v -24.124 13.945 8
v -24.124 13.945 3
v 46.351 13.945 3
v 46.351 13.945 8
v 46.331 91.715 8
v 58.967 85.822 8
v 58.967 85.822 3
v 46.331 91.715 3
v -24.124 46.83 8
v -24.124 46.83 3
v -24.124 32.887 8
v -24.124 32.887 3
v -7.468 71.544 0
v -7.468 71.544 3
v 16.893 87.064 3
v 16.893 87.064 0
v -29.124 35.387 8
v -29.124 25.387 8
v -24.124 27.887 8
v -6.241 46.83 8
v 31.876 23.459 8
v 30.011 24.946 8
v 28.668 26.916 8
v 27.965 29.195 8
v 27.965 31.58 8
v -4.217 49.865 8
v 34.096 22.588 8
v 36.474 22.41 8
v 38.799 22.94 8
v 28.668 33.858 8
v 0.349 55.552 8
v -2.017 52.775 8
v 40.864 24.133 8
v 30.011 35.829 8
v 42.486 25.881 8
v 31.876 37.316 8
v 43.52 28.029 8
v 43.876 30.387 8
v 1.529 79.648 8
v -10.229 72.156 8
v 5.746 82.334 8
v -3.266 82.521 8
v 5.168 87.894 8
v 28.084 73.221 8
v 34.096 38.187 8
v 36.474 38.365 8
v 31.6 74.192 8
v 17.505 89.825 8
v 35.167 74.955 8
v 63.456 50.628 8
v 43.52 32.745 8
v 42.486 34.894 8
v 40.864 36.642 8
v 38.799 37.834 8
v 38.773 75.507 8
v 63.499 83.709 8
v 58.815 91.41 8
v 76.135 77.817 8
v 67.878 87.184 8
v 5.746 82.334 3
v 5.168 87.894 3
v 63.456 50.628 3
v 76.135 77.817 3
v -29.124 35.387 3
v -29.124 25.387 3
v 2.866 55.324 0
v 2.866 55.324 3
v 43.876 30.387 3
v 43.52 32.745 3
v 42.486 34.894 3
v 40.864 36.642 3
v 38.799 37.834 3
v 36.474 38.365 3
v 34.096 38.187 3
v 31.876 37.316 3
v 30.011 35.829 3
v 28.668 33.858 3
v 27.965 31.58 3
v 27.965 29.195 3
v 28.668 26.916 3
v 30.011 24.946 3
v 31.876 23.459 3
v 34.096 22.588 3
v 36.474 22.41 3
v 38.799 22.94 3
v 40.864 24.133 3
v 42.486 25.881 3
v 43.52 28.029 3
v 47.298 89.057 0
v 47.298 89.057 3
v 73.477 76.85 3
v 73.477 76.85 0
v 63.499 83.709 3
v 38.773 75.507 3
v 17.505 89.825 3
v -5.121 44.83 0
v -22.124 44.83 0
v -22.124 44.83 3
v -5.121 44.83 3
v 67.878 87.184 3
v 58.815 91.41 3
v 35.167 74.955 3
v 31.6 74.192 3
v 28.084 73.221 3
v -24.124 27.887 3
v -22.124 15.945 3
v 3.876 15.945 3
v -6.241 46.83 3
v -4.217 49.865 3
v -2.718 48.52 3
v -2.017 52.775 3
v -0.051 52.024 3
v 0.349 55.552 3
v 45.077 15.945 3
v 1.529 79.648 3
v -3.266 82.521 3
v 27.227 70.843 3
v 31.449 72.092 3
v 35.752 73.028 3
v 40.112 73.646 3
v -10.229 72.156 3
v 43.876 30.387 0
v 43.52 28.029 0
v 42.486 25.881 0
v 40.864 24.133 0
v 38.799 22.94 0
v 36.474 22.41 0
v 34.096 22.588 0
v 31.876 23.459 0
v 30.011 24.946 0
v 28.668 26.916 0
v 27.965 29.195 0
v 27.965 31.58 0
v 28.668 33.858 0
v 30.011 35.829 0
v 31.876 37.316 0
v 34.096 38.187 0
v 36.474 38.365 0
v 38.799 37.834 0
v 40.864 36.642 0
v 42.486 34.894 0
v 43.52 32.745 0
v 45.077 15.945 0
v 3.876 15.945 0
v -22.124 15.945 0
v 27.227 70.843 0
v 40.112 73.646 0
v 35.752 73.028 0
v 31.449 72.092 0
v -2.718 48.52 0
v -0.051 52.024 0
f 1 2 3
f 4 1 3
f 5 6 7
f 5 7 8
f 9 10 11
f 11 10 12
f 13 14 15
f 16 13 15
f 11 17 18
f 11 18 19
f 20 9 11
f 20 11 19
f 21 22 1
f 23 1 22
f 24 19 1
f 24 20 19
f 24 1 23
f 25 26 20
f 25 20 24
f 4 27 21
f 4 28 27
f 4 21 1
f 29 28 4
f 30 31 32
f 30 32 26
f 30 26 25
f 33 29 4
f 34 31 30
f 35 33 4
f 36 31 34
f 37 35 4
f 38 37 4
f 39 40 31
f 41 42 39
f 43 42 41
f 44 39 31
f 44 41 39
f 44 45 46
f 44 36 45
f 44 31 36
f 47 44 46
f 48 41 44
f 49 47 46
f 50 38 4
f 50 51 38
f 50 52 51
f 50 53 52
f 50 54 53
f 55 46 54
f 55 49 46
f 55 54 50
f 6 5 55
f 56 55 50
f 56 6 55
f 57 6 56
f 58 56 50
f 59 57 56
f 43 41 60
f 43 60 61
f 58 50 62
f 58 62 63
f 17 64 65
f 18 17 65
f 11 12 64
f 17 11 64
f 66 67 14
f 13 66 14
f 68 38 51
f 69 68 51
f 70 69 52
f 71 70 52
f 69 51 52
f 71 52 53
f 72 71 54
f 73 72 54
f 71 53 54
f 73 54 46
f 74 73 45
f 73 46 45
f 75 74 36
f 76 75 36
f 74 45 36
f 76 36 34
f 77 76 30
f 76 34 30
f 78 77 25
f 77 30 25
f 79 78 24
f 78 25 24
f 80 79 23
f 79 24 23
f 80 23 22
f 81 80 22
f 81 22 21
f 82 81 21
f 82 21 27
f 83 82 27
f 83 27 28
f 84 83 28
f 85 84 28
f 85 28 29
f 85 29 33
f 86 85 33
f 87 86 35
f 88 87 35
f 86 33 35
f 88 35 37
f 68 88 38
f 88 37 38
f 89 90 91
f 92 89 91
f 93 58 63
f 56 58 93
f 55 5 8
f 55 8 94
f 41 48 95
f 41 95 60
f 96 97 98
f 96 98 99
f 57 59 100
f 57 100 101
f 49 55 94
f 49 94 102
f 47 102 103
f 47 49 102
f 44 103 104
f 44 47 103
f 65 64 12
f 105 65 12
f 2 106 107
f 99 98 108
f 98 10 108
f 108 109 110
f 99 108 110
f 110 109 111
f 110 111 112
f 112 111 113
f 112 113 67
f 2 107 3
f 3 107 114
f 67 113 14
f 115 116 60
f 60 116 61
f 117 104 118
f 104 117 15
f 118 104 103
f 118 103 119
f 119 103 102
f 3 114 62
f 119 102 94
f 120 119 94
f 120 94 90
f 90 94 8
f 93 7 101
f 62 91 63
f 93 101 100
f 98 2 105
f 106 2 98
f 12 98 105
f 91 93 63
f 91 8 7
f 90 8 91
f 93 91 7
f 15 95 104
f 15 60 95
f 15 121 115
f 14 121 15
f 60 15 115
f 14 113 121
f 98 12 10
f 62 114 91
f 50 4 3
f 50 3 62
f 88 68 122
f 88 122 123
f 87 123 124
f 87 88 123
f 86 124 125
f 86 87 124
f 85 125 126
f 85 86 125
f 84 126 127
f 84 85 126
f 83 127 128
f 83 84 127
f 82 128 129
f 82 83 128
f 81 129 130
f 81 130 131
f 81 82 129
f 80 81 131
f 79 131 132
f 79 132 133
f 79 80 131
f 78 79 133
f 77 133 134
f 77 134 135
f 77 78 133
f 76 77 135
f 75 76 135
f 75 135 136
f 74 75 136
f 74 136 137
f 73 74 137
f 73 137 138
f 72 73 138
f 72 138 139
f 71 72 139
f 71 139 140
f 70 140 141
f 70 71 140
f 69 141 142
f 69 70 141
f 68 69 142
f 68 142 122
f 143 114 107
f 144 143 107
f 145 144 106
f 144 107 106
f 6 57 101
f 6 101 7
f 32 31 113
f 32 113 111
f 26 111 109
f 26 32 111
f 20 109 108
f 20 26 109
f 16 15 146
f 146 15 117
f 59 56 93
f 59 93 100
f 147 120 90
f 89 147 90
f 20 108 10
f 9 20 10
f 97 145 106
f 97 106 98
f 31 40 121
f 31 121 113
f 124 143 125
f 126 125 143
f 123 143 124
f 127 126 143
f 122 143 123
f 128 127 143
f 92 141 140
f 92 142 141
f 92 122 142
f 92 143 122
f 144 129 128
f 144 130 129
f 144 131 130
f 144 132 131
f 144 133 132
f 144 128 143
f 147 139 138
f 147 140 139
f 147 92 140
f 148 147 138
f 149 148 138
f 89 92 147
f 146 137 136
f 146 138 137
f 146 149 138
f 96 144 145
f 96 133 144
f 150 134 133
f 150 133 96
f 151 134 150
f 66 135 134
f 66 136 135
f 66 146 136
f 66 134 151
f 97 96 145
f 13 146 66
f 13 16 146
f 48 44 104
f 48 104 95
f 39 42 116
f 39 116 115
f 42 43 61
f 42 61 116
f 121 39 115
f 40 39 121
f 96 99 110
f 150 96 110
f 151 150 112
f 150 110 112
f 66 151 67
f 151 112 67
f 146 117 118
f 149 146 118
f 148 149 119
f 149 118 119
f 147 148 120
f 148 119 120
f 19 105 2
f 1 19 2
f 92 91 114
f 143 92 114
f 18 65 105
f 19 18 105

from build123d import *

# Parameters (mm, degrees)
F_1_1_2_2_6_BASE_SUJETADOR_OUTLINE_W   = 26
F_1_1_2_2_6_BASE_SUJETADOR_OUTLINE_H   = 28.884781413
F_1_1_2_2_6_BASE_SUJETADOR_OUTLINE_R   = 8
F_1_1_2_2_6_BASE_SUJETADOR_DEPTH       = 8
F_1_1_2_2_6_BASE_SUJETADOR_START       = 3
F_1_1_2_2_6_BASE_SUJETADOR_2_OUTLINE_W = 26
F_1_1_2_2_6_BASE_SUJETADOR_2_OUTLINE_H = 28.884781413
F_1_1_2_2_6_BASE_SUJETADOR_2_DEPTH     = 5
CROQUIS2_R                             = 8
SALIENTE_EXTRUIR1_DEPTH                = 5
CROQUIS3_R                             = 8
SALIENTE_EXTRUIR2_DEPTH                = 3


# Read off the part's stored shape, not the designer's step: 1.1.2.2.6_Base_Sujetador
with BuildPart() as part:
    # 1.1.2.2.6_Base_Sujetador outline → 1.1.2.2.6_Base_Sujetador (new body)
    with BuildSketch(Plane.XY):
        with Locations((-9.12411578, 30.387347077)):
            Rectangle(F_1_1_2_2_6_BASE_SUJETADOR_OUTLINE_W, F_1_1_2_2_6_BASE_SUJETADOR_OUTLINE_H)
        with Locations((-9.12411578, 30.387347076)):
            Circle(F_1_1_2_2_6_BASE_SUJETADOR_OUTLINE_R, mode=Mode.SUBTRACT)
    extrude(amount=F_1_1_2_2_6_BASE_SUJETADOR_DEPTH)

    # 1.1.2.2.6_Base_Sujetador 2 outline → 1.1.2.2.6_Base_Sujetador 2 (add)
    with BuildSketch(Plane.XY.offset(F_1_1_2_2_6_BASE_SUJETADOR_START)):
        Polygon((-24.12411578, 27.887347076), (-24.12411578, 13.94495637), (5.87588422, 13.94495637), (5.87588422, 46.829737783), (-24.12411578, 46.829737783), (-24.12411578, 32.887347076), (-29.12411578, 35.387347076), (-29.12411578, 25.387347076), align=None)
        with Locations((-9.12411578, 30.387347077)):
            Rectangle(F_1_1_2_2_6_BASE_SUJETADOR_2_OUTLINE_W, F_1_1_2_2_6_BASE_SUJETADOR_2_OUTLINE_H, mode=Mode.SUBTRACT)
    extrude(amount=F_1_1_2_2_6_BASE_SUJETADOR_2_DEPTH)

    # Croquis2 → Saliente-Extruir1 (add)
    # profile 1 of 2: a face of its own
    with BuildSketch(Plane.XY.offset(8)):
        Polygon((-6.240696441, 46.829737783), (-24.12411578, 46.829737783), (-24.12411578, 32.887347076), (-29.12411578, 35.387347076), (-29.12411578, 25.387347076), (-24.12411578, 27.887347076), (-24.12411578, 13.94495637), (5.87588422, 13.94495637), (5.87588422, 46.829737783), align=None)
    # profile 2 of 2: a face of its own
    with BuildSketch(Plane.XY.offset(8)):
        with BuildLine():
            ThreePointArc((0.348971375, 55.551526377), (-3.138373762, 51.336082183), (-6.240696441, 46.829737783))
            Line((-6.240696441, 46.829737783), (5.87588422, 46.829737783))
            Line((5.87588422, 46.829737783), (5.87588422, 13.94495637))
            Line((5.87588422, 13.94495637), (46.350842356, 13.94495637))
            Line((46.350842356, 13.94495637), (63.456298807, 50.627726109))
            Line((63.456298807, 50.627726109), (76.134846658, 77.81695972))
            Line((76.134846658, 77.81695972), (63.498749391, 83.709268645))
            Line((63.498749391, 83.709268645), (67.877610167, 87.184261926))
            Line((67.877610167, 87.184261926), (58.814532297, 91.410444543))
            Line((58.814532297, 91.410444543), (58.967210456, 85.822359953))
            Line((58.967210456, 85.822359953), (46.331113188, 91.714668878))
            Line((46.331113188, 91.714668878), (38.773253593, 75.506786672))
            ThreePointArc((38.773253593, 75.506786672), (33.378020355, 74.599590907), (28.083714716, 73.220506552))
            Line((28.083714716, 73.220506552), (17.505279389, 89.825323912))
            Line((17.505279389, 89.825323912), (5.746386333, 82.334082846))
            Line((5.746386333, 82.334082846), (5.168366906, 87.894289096))
            Line((5.168366906, 87.894289096), (-3.265547552, 82.521293012))
            Line((-3.265547552, 82.521293012), (1.529429104, 79.647584804))
            Line((1.529429104, 79.647584804), (-10.229463952, 72.156343738))
            Line((-10.229463952, 72.156343738), (0.348971375, 55.551526377))
        make_face()
        with Locations((35.87588422, 30.387347076)):
            Circle(CROQUIS2_R, mode=Mode.SUBTRACT)
    extrude(amount=-SALIENTE_EXTRUIR1_DEPTH)

    # Croquis3 → Saliente-Extruir2 (add)
    with BuildSketch(Plane(origin=(0, 0, 3), x_dir=(-1, 0, 0), z_dir=(0, 0, -1))):
        with BuildLine():
            Line((-73.476994561, 76.849580669), (-45.076701834, 15.94495637))
            Line((-45.076701834, 15.94495637), (22.12411578, 15.94495637))
            Line((22.12411578, 15.94495637), (22.12411578, 44.829737783))
            Line((22.12411578, 44.829737783), (5.12054128, 44.829737783))
            ThreePointArc((5.12054128, 44.829737783), (1.416566873, 50.296678088), (-2.865505455, 55.32367712))
            Line((-2.865505455, 55.32367712), (7.468081844, 71.544160063))
            Line((7.468081844, 71.544160063), (-16.893095714, 87.063941804))
            Line((-16.893095714, 87.063941804), (-27.226683013, 70.843458861))
            ThreePointArc((-27.226683013, 70.843458861), (-33.592373346, 72.599832764), (-40.112471141, 73.646344803))
            Line((-40.112471141, 73.646344803), (-47.298492239, 89.05681678))
            Line((-47.298492239, 89.05681678), (-73.476994561, 76.849580669))
        make_face()
        with Locations(Location((-35.87588422, 30.387347076, 0), (0, 0, 180))):
            Circle(CROQUIS3_R, mode=Mode.SUBTRACT)
    extrude(amount=SALIENTE_EXTRUIR2_DEPTH)


solid = part.part
